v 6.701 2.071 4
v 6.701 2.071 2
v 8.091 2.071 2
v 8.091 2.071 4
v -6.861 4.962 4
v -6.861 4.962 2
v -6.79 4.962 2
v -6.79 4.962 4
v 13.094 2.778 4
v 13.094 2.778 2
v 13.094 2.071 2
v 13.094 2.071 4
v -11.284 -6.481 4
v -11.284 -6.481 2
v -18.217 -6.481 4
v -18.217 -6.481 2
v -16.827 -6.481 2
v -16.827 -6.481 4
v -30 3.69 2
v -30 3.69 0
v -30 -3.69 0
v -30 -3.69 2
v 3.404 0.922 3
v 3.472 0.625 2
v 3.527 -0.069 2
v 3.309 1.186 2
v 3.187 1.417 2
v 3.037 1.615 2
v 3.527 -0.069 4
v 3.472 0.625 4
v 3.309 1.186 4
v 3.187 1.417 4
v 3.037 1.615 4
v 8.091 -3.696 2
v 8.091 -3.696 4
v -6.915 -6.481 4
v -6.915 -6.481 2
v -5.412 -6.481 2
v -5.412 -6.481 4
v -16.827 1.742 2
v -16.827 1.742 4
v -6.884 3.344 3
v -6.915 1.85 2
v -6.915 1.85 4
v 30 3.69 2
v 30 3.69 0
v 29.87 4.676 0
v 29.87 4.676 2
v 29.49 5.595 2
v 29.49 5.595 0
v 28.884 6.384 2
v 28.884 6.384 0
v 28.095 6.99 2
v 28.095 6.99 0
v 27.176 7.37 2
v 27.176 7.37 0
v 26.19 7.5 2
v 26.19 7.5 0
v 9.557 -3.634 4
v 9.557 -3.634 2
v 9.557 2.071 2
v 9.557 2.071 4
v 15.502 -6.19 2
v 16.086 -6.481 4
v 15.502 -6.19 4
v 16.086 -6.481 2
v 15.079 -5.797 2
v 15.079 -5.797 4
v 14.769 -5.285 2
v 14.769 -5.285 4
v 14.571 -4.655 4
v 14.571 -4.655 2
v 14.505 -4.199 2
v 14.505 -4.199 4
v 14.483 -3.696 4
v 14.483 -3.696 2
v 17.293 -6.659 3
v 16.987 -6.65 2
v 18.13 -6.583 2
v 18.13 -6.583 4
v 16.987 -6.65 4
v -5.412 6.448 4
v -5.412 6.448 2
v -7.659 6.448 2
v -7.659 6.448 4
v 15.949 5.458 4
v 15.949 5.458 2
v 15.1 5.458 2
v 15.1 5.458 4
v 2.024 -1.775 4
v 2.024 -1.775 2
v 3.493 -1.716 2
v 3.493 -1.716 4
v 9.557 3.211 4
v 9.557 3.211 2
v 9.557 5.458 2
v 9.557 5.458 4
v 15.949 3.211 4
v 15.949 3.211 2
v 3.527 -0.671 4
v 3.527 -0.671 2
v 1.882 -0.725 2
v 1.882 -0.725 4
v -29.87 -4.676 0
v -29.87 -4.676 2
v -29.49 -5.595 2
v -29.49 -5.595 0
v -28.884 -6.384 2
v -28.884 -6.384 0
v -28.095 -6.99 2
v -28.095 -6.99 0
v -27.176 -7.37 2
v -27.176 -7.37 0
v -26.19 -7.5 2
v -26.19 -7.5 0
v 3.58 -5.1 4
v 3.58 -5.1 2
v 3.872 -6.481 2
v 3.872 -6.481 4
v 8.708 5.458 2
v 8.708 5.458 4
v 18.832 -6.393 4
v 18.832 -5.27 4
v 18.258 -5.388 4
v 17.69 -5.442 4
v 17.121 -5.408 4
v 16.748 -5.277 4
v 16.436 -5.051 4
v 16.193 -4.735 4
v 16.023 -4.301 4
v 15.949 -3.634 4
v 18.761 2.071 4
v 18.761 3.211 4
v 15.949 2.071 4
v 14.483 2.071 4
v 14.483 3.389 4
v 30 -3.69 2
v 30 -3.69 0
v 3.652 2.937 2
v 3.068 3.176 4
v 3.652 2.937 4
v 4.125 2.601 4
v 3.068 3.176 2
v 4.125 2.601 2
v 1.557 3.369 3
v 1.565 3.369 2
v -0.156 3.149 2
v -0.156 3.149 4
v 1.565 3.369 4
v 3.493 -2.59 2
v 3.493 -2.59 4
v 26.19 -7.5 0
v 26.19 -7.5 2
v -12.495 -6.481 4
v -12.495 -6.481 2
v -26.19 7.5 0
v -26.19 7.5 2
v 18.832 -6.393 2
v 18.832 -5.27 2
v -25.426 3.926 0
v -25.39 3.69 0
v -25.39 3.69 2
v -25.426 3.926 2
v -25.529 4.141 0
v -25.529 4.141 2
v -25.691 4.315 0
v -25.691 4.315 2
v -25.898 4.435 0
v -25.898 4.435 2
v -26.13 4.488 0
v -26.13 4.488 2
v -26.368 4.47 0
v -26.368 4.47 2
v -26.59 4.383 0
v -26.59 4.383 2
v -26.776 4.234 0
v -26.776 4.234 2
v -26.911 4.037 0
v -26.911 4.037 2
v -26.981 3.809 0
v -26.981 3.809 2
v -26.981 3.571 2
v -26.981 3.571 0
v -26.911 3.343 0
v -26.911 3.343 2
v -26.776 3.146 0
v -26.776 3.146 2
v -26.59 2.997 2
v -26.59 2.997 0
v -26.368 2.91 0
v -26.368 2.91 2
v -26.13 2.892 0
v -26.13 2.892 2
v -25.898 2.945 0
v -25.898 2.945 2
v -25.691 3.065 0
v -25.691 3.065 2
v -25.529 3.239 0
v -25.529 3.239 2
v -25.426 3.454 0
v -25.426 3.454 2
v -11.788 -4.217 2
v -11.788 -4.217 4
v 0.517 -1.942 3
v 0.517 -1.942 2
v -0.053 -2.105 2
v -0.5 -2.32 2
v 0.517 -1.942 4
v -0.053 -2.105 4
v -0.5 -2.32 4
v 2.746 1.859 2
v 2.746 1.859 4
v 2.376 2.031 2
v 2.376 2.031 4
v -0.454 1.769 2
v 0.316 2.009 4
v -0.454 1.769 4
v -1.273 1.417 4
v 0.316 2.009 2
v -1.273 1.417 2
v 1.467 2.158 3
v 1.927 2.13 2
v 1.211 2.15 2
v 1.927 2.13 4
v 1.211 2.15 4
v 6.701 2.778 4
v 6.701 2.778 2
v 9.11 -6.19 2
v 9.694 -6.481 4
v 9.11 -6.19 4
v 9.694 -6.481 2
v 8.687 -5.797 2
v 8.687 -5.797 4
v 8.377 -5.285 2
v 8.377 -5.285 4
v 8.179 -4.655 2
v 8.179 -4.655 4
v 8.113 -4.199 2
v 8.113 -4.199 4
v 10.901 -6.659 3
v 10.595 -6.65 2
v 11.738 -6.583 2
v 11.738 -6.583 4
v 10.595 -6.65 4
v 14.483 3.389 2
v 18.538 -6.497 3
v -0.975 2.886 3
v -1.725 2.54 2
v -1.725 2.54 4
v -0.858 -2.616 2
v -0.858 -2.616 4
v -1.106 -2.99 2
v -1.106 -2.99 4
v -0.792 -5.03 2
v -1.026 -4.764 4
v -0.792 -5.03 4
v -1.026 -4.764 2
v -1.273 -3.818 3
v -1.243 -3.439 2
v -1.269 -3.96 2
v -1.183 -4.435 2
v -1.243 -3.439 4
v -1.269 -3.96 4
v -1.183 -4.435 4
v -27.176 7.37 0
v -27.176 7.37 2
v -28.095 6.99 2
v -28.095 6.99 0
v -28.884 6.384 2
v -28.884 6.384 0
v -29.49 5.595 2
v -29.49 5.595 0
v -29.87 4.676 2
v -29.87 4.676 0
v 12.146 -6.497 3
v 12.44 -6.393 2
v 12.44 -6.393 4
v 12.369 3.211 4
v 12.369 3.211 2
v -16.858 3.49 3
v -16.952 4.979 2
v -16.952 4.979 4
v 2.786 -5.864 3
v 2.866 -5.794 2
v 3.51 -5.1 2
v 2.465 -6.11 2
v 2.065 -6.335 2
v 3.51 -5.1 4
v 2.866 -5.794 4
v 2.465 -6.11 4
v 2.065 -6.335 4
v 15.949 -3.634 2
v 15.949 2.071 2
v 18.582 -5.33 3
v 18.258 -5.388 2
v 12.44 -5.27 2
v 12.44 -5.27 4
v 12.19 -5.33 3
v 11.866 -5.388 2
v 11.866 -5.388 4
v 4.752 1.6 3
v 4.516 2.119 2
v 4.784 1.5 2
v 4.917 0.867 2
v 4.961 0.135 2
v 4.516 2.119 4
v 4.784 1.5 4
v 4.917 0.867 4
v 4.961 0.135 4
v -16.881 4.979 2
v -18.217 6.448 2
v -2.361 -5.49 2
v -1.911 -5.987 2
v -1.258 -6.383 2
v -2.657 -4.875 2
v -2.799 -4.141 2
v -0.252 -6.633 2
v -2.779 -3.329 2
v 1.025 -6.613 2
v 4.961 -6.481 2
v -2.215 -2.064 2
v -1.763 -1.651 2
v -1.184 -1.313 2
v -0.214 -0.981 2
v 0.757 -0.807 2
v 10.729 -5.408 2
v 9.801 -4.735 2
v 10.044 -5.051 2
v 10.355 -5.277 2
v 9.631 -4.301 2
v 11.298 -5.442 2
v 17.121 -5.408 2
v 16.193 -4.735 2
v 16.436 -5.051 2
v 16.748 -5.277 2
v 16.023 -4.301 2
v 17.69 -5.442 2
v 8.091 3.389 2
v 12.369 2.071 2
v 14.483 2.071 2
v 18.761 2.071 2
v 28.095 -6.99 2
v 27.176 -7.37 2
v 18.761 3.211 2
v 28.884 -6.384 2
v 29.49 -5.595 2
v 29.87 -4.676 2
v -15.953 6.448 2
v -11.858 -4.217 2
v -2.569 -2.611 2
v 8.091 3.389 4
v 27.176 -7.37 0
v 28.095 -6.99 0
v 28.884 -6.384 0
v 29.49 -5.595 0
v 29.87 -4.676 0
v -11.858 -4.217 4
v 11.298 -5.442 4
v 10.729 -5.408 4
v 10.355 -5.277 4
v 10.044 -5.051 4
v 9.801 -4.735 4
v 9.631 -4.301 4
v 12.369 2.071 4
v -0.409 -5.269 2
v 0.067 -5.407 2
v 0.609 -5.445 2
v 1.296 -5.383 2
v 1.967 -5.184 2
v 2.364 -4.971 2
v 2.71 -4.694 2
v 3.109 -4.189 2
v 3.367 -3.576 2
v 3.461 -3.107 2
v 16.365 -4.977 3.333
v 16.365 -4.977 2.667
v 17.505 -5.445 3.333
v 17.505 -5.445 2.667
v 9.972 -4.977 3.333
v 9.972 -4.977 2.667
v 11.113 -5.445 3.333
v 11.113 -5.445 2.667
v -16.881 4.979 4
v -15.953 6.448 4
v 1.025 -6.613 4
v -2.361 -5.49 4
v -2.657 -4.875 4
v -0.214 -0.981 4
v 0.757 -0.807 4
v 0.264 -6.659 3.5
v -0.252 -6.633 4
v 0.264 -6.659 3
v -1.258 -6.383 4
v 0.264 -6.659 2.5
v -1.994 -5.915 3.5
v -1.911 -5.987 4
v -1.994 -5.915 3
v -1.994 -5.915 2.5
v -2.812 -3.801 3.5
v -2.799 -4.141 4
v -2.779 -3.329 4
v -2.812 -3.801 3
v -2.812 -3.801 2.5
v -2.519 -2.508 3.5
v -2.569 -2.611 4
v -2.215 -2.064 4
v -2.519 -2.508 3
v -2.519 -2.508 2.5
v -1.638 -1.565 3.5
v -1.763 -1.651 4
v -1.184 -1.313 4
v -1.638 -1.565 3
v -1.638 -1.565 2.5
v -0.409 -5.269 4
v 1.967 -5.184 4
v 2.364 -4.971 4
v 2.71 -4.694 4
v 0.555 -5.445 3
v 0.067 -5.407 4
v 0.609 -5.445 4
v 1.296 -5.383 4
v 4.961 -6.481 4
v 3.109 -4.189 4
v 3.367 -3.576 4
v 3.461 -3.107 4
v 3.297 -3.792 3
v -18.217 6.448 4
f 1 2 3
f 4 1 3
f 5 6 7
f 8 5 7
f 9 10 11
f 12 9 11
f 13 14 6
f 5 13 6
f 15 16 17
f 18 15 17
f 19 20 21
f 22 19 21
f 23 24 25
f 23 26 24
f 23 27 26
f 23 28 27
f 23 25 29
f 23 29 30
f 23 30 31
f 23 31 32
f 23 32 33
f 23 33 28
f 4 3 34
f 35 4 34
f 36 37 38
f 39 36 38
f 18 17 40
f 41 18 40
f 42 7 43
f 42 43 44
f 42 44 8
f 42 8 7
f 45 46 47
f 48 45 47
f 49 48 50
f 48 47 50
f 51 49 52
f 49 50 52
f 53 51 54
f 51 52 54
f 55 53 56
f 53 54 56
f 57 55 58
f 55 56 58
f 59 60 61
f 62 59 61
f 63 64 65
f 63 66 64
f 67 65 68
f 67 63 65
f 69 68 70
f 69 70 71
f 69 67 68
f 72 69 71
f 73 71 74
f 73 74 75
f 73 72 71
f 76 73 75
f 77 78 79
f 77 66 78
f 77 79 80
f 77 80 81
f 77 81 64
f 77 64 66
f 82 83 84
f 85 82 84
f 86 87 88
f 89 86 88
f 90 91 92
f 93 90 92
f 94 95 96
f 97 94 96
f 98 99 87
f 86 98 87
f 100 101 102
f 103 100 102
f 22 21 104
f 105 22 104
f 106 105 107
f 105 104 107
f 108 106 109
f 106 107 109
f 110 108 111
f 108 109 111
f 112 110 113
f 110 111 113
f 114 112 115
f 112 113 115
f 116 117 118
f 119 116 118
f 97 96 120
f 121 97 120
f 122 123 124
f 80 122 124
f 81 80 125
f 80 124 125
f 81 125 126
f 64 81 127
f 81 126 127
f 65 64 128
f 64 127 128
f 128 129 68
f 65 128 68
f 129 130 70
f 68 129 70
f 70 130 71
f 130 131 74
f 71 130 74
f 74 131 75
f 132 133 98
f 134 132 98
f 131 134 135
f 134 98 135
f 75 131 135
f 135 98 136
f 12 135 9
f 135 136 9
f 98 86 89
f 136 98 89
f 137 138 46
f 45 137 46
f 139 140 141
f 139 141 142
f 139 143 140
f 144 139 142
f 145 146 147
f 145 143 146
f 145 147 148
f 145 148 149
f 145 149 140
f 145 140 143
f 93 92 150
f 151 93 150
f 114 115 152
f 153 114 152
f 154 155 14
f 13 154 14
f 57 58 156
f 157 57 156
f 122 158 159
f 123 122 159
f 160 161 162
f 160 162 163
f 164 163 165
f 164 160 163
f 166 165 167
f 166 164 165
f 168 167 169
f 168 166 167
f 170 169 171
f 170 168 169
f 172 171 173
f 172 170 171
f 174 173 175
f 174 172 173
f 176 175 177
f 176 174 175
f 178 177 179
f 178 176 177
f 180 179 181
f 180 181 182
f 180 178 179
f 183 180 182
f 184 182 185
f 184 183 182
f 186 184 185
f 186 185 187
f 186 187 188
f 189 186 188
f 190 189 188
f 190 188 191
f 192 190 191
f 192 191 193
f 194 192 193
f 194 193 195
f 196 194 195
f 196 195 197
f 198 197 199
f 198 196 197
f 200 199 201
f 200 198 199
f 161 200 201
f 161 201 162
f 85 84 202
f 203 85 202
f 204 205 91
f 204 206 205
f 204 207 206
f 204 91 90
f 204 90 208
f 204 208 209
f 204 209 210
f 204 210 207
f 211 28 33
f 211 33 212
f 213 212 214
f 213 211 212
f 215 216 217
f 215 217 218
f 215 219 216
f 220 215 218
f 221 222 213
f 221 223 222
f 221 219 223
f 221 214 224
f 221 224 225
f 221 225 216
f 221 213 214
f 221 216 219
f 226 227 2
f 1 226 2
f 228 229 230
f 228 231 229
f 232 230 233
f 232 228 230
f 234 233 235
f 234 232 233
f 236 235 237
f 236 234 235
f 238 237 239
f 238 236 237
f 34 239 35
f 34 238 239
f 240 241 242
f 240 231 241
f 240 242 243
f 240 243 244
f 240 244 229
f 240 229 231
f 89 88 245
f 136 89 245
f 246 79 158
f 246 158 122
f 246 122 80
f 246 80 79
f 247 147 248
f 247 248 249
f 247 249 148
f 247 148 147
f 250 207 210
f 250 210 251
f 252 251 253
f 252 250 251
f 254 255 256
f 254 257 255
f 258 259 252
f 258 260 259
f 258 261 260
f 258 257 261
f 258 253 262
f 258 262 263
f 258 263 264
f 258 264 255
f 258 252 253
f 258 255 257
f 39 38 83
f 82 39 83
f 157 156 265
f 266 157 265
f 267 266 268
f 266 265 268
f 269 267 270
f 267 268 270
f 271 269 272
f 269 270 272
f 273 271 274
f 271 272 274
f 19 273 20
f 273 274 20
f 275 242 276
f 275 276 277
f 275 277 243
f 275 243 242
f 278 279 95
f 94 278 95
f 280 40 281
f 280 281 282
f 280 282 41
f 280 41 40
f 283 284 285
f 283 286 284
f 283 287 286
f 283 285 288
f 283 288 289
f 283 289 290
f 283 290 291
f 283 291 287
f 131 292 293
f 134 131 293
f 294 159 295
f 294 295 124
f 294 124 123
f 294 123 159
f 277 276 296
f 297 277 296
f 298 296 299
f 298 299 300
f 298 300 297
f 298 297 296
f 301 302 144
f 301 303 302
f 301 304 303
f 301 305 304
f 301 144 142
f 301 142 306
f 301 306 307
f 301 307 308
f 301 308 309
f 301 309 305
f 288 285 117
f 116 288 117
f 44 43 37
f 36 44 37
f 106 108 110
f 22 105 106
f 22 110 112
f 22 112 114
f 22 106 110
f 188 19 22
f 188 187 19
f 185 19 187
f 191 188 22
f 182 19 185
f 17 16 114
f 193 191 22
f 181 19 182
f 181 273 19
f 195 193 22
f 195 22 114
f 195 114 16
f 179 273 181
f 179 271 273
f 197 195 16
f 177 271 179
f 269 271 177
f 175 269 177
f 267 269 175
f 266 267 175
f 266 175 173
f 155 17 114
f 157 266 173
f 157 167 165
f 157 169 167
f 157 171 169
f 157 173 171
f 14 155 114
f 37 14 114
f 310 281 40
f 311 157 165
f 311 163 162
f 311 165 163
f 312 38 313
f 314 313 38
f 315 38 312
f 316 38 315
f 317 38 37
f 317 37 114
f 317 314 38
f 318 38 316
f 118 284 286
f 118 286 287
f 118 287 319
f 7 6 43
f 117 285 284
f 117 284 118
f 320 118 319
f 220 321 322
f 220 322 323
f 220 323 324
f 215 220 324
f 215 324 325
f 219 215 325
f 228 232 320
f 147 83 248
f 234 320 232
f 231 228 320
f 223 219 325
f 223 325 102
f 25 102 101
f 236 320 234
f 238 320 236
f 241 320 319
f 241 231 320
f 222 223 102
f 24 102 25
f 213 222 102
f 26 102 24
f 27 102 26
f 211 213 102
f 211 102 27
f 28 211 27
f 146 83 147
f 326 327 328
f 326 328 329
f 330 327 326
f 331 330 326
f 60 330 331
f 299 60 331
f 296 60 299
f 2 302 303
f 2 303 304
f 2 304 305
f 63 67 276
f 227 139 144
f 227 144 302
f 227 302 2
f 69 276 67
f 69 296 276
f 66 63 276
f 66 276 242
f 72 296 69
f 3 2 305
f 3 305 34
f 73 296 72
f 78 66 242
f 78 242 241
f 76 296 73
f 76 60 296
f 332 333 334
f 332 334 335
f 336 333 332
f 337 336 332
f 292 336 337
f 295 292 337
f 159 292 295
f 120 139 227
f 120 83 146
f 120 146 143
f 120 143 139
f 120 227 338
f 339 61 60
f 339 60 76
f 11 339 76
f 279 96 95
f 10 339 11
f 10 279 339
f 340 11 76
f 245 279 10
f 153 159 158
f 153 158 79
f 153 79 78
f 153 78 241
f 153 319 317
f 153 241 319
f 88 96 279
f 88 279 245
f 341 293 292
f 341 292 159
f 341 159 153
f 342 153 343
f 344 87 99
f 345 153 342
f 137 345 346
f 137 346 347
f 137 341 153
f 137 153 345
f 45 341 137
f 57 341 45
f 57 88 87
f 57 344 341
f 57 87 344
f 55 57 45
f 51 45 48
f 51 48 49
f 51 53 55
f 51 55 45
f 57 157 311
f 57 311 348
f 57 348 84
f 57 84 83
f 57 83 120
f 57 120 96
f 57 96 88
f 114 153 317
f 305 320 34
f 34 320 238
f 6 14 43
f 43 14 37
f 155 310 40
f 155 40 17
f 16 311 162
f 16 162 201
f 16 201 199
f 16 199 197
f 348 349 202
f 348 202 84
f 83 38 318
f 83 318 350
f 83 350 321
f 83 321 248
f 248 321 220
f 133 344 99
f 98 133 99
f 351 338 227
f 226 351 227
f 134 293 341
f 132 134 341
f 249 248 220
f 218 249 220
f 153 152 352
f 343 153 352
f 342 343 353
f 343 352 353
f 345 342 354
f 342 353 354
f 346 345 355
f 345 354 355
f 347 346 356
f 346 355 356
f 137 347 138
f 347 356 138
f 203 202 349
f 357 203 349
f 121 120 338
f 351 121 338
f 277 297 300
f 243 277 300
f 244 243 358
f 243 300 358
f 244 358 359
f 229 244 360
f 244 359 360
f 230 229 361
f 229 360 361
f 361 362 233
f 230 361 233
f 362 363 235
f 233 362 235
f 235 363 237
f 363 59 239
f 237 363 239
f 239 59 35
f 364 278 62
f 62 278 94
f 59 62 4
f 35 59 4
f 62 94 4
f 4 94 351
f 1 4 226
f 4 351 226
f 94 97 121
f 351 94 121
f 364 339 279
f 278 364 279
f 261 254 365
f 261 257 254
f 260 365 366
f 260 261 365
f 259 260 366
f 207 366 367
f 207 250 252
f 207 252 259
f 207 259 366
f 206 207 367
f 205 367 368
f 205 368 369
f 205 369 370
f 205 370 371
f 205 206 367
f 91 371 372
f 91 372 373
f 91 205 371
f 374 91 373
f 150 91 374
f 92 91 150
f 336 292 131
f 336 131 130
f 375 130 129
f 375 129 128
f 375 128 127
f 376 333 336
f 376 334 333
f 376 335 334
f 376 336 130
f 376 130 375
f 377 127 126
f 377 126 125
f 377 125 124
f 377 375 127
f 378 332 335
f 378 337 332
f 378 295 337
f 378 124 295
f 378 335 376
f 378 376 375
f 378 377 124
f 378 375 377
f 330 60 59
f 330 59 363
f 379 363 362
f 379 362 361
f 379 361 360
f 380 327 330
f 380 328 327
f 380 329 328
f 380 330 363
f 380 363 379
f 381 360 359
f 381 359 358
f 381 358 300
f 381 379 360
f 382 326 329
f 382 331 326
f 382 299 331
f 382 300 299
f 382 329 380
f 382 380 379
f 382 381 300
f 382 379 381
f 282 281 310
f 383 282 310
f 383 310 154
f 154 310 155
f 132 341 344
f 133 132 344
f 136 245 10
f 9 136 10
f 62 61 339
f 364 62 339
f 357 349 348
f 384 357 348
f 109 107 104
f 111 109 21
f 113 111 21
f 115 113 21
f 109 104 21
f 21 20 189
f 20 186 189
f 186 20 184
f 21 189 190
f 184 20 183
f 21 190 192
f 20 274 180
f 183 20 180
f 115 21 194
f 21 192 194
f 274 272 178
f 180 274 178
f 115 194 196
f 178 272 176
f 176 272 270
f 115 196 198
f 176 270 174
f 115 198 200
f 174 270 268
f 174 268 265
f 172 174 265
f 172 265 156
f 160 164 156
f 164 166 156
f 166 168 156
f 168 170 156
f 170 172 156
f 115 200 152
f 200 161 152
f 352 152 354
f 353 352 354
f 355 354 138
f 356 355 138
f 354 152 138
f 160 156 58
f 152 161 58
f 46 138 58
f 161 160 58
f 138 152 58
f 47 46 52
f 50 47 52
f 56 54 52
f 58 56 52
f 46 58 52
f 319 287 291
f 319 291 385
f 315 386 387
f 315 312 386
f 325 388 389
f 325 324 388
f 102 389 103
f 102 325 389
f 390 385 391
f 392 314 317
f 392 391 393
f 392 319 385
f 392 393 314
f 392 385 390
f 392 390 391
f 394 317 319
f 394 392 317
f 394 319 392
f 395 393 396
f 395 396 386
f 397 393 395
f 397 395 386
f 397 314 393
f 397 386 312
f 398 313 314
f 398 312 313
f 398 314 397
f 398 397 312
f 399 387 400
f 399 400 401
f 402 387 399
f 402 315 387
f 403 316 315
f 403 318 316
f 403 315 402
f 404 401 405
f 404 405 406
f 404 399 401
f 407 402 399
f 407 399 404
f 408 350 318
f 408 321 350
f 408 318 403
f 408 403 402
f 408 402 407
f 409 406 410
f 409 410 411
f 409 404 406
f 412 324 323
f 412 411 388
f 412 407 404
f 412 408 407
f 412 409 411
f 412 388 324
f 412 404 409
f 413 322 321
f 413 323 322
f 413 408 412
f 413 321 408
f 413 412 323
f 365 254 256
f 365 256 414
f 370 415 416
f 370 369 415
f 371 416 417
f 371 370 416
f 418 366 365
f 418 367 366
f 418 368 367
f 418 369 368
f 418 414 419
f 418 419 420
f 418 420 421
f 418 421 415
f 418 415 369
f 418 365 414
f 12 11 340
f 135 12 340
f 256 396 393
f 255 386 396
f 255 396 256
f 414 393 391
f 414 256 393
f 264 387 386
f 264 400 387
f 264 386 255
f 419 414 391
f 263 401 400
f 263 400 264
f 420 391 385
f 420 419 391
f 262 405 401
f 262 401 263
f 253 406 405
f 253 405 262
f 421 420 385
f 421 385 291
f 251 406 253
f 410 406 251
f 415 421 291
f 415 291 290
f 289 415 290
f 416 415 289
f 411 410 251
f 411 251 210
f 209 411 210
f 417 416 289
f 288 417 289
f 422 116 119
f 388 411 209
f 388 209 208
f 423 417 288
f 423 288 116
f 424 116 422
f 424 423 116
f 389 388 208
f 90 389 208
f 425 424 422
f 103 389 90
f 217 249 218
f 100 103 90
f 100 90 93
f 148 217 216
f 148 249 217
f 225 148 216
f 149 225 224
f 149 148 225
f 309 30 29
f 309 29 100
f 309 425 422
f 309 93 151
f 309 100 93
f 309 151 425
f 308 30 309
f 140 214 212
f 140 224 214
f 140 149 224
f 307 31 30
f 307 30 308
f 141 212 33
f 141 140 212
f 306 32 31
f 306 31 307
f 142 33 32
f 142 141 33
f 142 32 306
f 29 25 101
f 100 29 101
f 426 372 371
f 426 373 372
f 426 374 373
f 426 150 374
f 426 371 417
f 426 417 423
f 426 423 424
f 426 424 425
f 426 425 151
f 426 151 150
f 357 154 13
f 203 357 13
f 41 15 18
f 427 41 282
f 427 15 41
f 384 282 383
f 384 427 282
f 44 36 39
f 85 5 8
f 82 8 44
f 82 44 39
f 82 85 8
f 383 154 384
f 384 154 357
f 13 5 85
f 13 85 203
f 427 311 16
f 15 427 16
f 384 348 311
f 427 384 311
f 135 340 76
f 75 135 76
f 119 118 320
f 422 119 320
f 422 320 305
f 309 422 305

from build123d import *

# Parameters (mm, degrees)
F0_R     = 0.8
F1_DEPTH = 2
F2_DEPTH = 4
F3_DEPTH = 4
F4_DEPTH = 2
F5_DEPTH = 4
F6_DEPTH = 2.5


with BuildPart() as f1:
    # F0 (on Top) → F1 (new body)
    with BuildSketch(Plane.XY):
        with BuildLine():
            ThreePointArc((30, 3.69), (28.8840768363, 6.3840768363), (26.19, 7.5))
            Line((26.19, 7.5), (-26.19, 7.5))
            ThreePointArc((-26.19, 7.5), (-28.8840768363, 6.3840768363), (-30, 3.69))
            Line((-30, 3.69), (-30, -3.69))
            ThreePointArc((-30, -3.69), (-28.8840768363, -6.3840768363), (-26.19, -7.5))
            Line((-26.19, -7.5), (26.19, -7.5))
            ThreePointArc((26.19, -7.5), (28.8840768363, -6.3840768363), (30, -3.69))
            Line((30, -3.69), (30, 3.69))
        make_face()
        with BuildLine():
            Line((-11.2838908856, -6.4806478423), (-12.4949831323, -6.4806478423))
            Line((-12.4949831323, -6.4806478423), (-16.8809480446, 4.9794540253))
            Line((-16.8809480446, 4.9794540253), (-16.9516894142, 4.9794540253))
            add(Edge.make_bspline(
                [(-16.9516894142, 4.9794540253), (-16.8271846037, 3.6183900751), (-16.8271846037, 1.7423289545)],
                knots=[0, 0, 0, 1, 1, 1], degree=2))
            Line((-16.8271846037, 1.7423289545), (-16.8271846037, -6.4806478423))
            Line((-16.8271846037, -6.4806478423), (-18.2165451018, -6.4806478423))
            Line((-18.2165451018, -6.4806478423), (-18.2165451018, 6.4480448572))
            Line((-18.2165451018, 6.4480448572), (-15.9528212761, 6.4480448572))
            Line((-15.9528212761, 6.4480448572), (-11.8583108063, -4.2169240166))
            Line((-11.8583108063, -4.2169240166), (-11.7875694368, -4.2169240166))
            Line((-11.7875694368, -4.2169240166), (-7.6591031097, 6.4480448572))
            Line((-7.6591031097, 6.4480448572), (-5.4123572127, 6.4480448572))
            Line((-5.4123572127, 6.4480448572), (-5.4123572127, -6.4806478423))
            Line((-5.4123572127, -6.4806478423), (-6.914903902, -6.4806478423))
            Line((-6.914903902, -6.4806478423), (-6.914903902, 1.8498558363))
            add(Edge.make_bspline(
                [(-6.914903902, 1.8498558363), (-6.914903902, 3.281661156), (-6.7903990916, 4.9624760966)],
                knots=[0, 0, 0, 1, 1, 1], degree=2))
            Line((-6.7903990916, 4.9624760966), (-6.8611404611, 4.9624760966))
            Line((-6.8611404611, 4.9624760966), (-11.2838908856, -6.4806478423))
        make_face(mode=Mode.SUBTRACT)
        with BuildLine():
            Line((4.9611572186, -6.4806478423), (3.8717401274, -6.4806478423))
            Line((3.8717401274, -6.4806478423), (3.5802856849, -5.0997763086))
            Line((3.5802856849, -5.0997763086), (3.5095443153, -5.0997763086))
            add(Edge.make_bspline(
                [(3.5095443153, -5.0997763086), (2.7851526911, -6.0109251485), (2.0650055491, -6.334920621)],
                knots=[0, 0, 0, 1, 1, 1], degree=2))
            add(Edge.make_bspline(
                [(2.0650055491, -6.334920621), (1.344858407, -6.6589160936), (0.2639302802, -6.6589160936)],
                knots=[0, 0, 0, 1, 1, 1], degree=2))
            add(Edge.make_bspline(
                [(0.2639302802, -6.6589160936), (-1.1763640039, -6.6589160936), (-1.9941342359, -5.9147168859)],
                knots=[0, 0, 0, 1, 1, 1], degree=2))
            add(Edge.make_bspline(
                [(-1.9941342359, -5.9147168859), (-2.8119044679, -5.1705176782), (-2.8119044679, -3.8009647636)],
                knots=[0, 0, 0, 1, 1, 1], degree=2))
            add(Edge.make_bspline(
                [(-2.8119044679, -3.8009647636), (-2.8119044679, -0.8666127546), (1.8824928156, -0.7251300155)],
                knots=[0, 0, 0, 1, 1, 1], degree=2))
            Line((1.8824928156, -0.7251300155), (3.526522244, -0.6713665746))
            Line((3.526522244, -0.6713665746), (3.526522244, -0.068650106))
            add(Edge.make_bspline(
                [(3.526522244, -0.068650106), (3.526522244, 1.0717007712), (3.0369919667, 1.6149944893)],
                knots=[0, 0, 0, 1, 1, 1], degree=2))
            add(Edge.make_bspline(
                [(3.0369919667, 1.6149944893), (2.5474616894, 2.1582882075), (1.4665335626, 2.1582882075)],
                knots=[0, 0, 0, 1, 1, 1], degree=2))
            add(Edge.make_bspline(
                [(1.4665335626, 2.1582882075), (0.2554413159, 2.1582882075), (-1.2725722664, 1.4169186546)],
                knots=[0, 0, 0, 1, 1, 1], degree=2))
            Line((-1.2725722664, 1.4169186546), (-1.7253170316, 2.5402916031))
            add(Edge.make_bspline(
                [(-1.7253170316, 2.5402916031), (-1.0094143717, 2.9279543082), (-0.1562734549, 3.1486673813)],
                knots=[0, 0, 0, 1, 1, 1], degree=2))
            add(Edge.make_bspline(
                [(-0.1562734549, 3.1486673813), (0.6968674619, 3.3693804543), (1.5570825157, 3.3693804543)],
                knots=[0, 0, 0, 1, 1, 1], degree=2))
            add(Edge.make_bspline(
                [(1.5570825157, 3.3693804543), (3.2888312423, 3.3693804543), (4.1249942304, 2.6011291809)],
                knots=[0, 0, 0, 1, 1, 1], degree=2))
            add(Edge.make_bspline(
                [(4.1249942304, 2.6011291809), (4.9611572186, 1.8328779076), (4.9611572186, 0.1350850383)],
                knots=[0, 0, 0, 1, 1, 1], degree=2))
            Line((4.9611572186, 0.1350850383), (4.9611572186, -6.4806478423))
        make_face(mode=Mode.SUBTRACT)
        with BuildLine():
            add(Edge.make_bspline(
                [(9.9724758377, -4.9766863256), (10.3884350907, -5.444994192), (11.1128267149, -5.444994192)],
                knots=[0, 0, 0, 1, 1, 1], degree=2))
            add(Edge.make_bspline(
                [(11.1128267149, -5.444994192), (11.5033190748, -5.444994192), (11.8655148869, -5.3884010964)],
                knots=[0, 0, 0, 1, 1, 1], degree=2))
            add(Edge.make_bspline(
                [(11.8655148869, -5.3884010964), (12.227710699, -5.3318080007), (12.4399348077, -5.2695555955)],
                knots=[0, 0, 0, 1, 1, 1], degree=2))
            Line((12.4399348077, -5.2695555955), (12.4399348077, -6.392928544))
            add(Edge.make_bspline(
                [(12.4399348077, -6.392928544), (12.202243806, -6.5061147353), (11.7381804217, -6.5825154144)],
                knots=[0, 0, 0, 1, 1, 1], degree=2))
            add(Edge.make_bspline(
                [(11.7381804217, -6.5825154144), (11.2741170375, -6.6589160936), (10.9006026062, -6.6589160936)],
                knots=[0, 0, 0, 1, 1, 1], degree=2))
            add(Edge.make_bspline(
                [(10.9006026062, -6.6589160936), (8.0907554076, -6.6589160936), (8.0907554076, -3.6962675367)],
                knots=[0, 0, 0, 1, 1, 1], degree=2))
            Line((8.0907554076, -3.6962675367), (8.0907554076, 2.0705689093))
            Line((8.0907554076, 2.0705689093), (6.7013949096, 2.0705689093))
            Line((6.7013949096, 2.0705689093), (6.7013949096, 2.7779826048))
            Line((6.7013949096, 2.7779826048), (8.0907554076, 3.3891880377))
            Line((8.0907554076, 3.3891880377), (8.7076201501, 5.4576656835))
            Line((8.7076201501, 5.4576656835), (9.5565165847, 5.4576656835))
            Line((9.5565165847, 5.4576656835), (9.5565165847, 3.2109197865))
            Line((9.5565165847, 3.2109197865), (12.3691934381, 3.2109197865))
            Line((12.3691934381, 3.2109197865), (12.3691934381, 2.0705689093))
            Line((12.3691934381, 2.0705689093), (9.5565165847, 2.0705689093))
            Line((9.5565165847, 2.0705689093), (9.5565165847, -3.6340151315))
            add(Edge.make_bspline(
                [(9.5565165847, -3.6340151315), (9.5565165847, -4.5083784592), (9.9724758377, -4.9766863256)],
                knots=[0, 0, 0, 1, 1, 1], degree=2))
        make_face(mode=Mode.SUBTRACT)
        with BuildLine():
            add(Edge.make_bspline(
                [(16.3646659905, -4.9766863256), (16.7806252435, -5.444994192), (17.5050168677, -5.444994192)],
                knots=[0, 0, 0, 1, 1, 1], degree=2))
            add(Edge.make_bspline(
                [(17.5050168677, -5.444994192), (17.8955092276, -5.444994192), (18.2577050397, -5.3884010964)],
                knots=[0, 0, 0, 1, 1, 1], degree=2))
            add(Edge.make_bspline(
                [(18.2577050397, -5.3884010964), (18.6199008518, -5.3318080007), (18.8321249605, -5.2695555955)],
                knots=[0, 0, 0, 1, 1, 1], degree=2))
            Line((18.8321249605, -5.2695555955), (18.8321249605, -6.392928544))
            add(Edge.make_bspline(
                [(18.8321249605, -6.392928544), (18.5944339588, -6.5061147353), (18.1303705745, -6.5825154144)],
                knots=[0, 0, 0, 1, 1, 1], degree=2))
            add(Edge.make_bspline(
                [(18.1303705745, -6.5825154144), (17.6663071903, -6.6589160936), (17.292792759, -6.6589160936)],
                knots=[0, 0, 0, 1, 1, 1], degree=2))
            add(Edge.make_bspline(
                [(17.292792759, -6.6589160936), (14.4829455604, -6.6589160936), (14.4829455604, -3.6962675367)],
                knots=[0, 0, 0, 1, 1, 1], degree=2))
            Line((14.4829455604, -3.6962675367), (14.4829455604, 2.0705689093))
            Line((14.4829455604, 2.0705689093), (13.0935850624, 2.0705689093))
            Line((13.0935850624, 2.0705689093), (13.0935850624, 2.7779826048))
            Line((13.0935850624, 2.7779826048), (14.4829455604, 3.3891880377))
            Line((14.4829455604, 3.3891880377), (15.0998103029, 5.4576656835))
            Line((15.0998103029, 5.4576656835), (15.9487067375, 5.4576656835))
            Line((15.9487067375, 5.4576656835), (15.9487067375, 3.2109197865))
            Line((15.9487067375, 3.2109197865), (18.7613835909, 3.2109197865))
            Line((18.7613835909, 3.2109197865), (18.7613835909, 2.0705689093))
            Line((18.7613835909, 2.0705689093), (15.9487067375, 2.0705689093))
            Line((15.9487067375, 2.0705689093), (15.9487067375, -3.6340151315))
            add(Edge.make_bspline(
                [(15.9487067375, -3.6340151315), (15.9487067375, -4.5083784592), (16.3646659905, -4.9766863256)],
                knots=[0, 0, 0, 1, 1, 1], degree=2))
        make_face(mode=Mode.SUBTRACT)
        with Locations((-26.19, 3.69)):
            Circle(F0_R, mode=Mode.SUBTRACT)
    extrude(amount=F1_DEPTH)

    # F0 (on Top) → F2 (join)
    with BuildSketch(Plane.XY):
        with BuildLine():
            Line((3.5802856849, -5.0997763086), (3.8717401274, -6.4806478423))
            Line((3.8717401274, -6.4806478423), (4.9611572186, -6.4806478423))
            Line((4.9611572186, -6.4806478423), (4.9611572186, 0.1350850383))
            add(Edge.make_bspline(
                [(4.1249942304, 2.6011291809), (4.9611572186, 1.8328779076), (4.9611572186, 0.1350850383)],
                knots=[0, 0, 0, 1, 1, 1], degree=2))
            add(Edge.make_bspline(
                [(1.5570825157, 3.3693804543), (3.2888312423, 3.3693804543), (4.1249942304, 2.6011291809)],
                knots=[0, 0, 0, 1, 1, 1], degree=2))
            add(Edge.make_bspline(
                [(-0.1562734549, 3.1486673813), (0.6968674619, 3.3693804543), (1.5570825157, 3.3693804543)],
                knots=[0, 0, 0, 1, 1, 1], degree=2))
            add(Edge.make_bspline(
                [(-1.7253170316, 2.5402916031), (-1.0094143717, 2.9279543082), (-0.1562734549, 3.1486673813)],
                knots=[0, 0, 0, 1, 1, 1], degree=2))
            Line((-1.7253170316, 2.5402916031), (-1.2725722664, 1.4169186546))
            add(Edge.make_bspline(
                [(1.4665335626, 2.1582882075), (0.2554413159, 2.1582882075), (-1.2725722664, 1.4169186546)],
                knots=[0, 0, 0, 1, 1, 1], degree=2))
            add(Edge.make_bspline(
                [(3.0369919667, 1.6149944893), (2.5474616894, 2.1582882075), (1.4665335626, 2.1582882075)],
                knots=[0, 0, 0, 1, 1, 1], degree=2))
            add(Edge.make_bspline(
                [(3.526522244, -0.068650106), (3.526522244, 1.0717007712), (3.0369919667, 1.6149944893)],
                knots=[0, 0, 0, 1, 1, 1], degree=2))
            Line((3.526522244, -0.068650106), (3.526522244, -0.6713665746))
            Line((3.526522244, -0.6713665746), (1.8824928156, -0.7251300155))
            add(Edge.make_bspline(
                [(-2.8119044679, -3.8009647636), (-2.8119044679, -0.8666127546), (1.8824928156, -0.7251300155)],
                knots=[0, 0, 0, 1, 1, 1], degree=2))
            add(Edge.make_bspline(
                [(-1.9941342359, -5.9147168859), (-2.8119044679, -5.1705176782), (-2.8119044679, -3.8009647636)],
                knots=[0, 0, 0, 1, 1, 1], degree=2))
            add(Edge.make_bspline(
                [(0.2639302802, -6.6589160936), (-1.1763640039, -6.6589160936), (-1.9941342359, -5.9147168859)],
                knots=[0, 0, 0, 1, 1, 1], degree=2))
            add(Edge.make_bspline(
                [(2.0650055491, -6.334920621), (1.344858407, -6.6589160936), (0.2639302802, -6.6589160936)],
                knots=[0, 0, 0, 1, 1, 1], degree=2))
            add(Edge.make_bspline(
                [(3.5095443153, -5.0997763086), (2.7851526911, -6.0109251485), (2.0650055491, -6.334920621)],
                knots=[0, 0, 0, 1, 1, 1], degree=2))
            Line((3.5095443153, -5.0997763086), (3.5802856849, -5.0997763086))
        make_face()
        with BuildLine():
            add(Edge.make_bspline(
                [(0.5553847228, -5.444994192), (1.9277672921, -5.444994192), (2.7101668394, -4.6937208474)],
                knots=[0, 0, 0, 1, 1, 1], degree=2))
            add(Edge.make_bspline(
                [(-0.7915309535, -5.0304497665), (-0.3104896405, -5.444994192), (0.5553847228, -5.444994192)],
                knots=[0, 0, 0, 1, 1, 1], degree=2))
            add(Edge.make_bspline(
                [(-1.2725722664, -3.8179426923), (-1.2725722664, -4.6159053409), (-0.7915309535, -5.0304497665)],
                knots=[0, 0, 0, 1, 1, 1], degree=2))
            add(Edge.make_bspline(
                [(-0.5000765109, -2.3196404852), (-1.2725722664, -2.8020966255), (-1.2725722664, -3.8179426923)],
                knots=[0, 0, 0, 1, 1, 1], degree=2))
            add(Edge.make_bspline(
                [(2.0239755547, -1.7749319396), (0.2724192446, -1.8371843448), (-0.5000765109, -2.3196404852)],
                knots=[0, 0, 0, 1, 1, 1], degree=2))
            Line((2.0239755547, -1.7749319396), (3.4925663866, -1.7155091892))
            Line((3.4925663866, -1.7155091892), (3.4925663866, -2.5898725169))
            add(Edge.make_bspline(
                [(2.7101668394, -4.6937208474), (3.4925663866, -3.9424475027), (3.4925663866, -2.5898725169)],
                knots=[0, 0, 0, 1, 1, 1], degree=2))
        make_face(mode=Mode.SUBTRACT)
    extrude(amount=F2_DEPTH)

    # F0 (on Top) → F3 (join)
    with BuildSketch(Plane.XY):
        with BuildLine():
            Line((-16.8809480446, 4.9794540253), (-12.4949831323, -6.4806478423))
            Line((-12.4949831323, -6.4806478423), (-11.2838908856, -6.4806478423))
            Line((-11.2838908856, -6.4806478423), (-6.8611404611, 4.9624760966))
            Line((-6.8611404611, 4.9624760966), (-6.7903990916, 4.9624760966))
            add(Edge.make_bspline(
                [(-6.914903902, 1.8498558363), (-6.914903902, 3.281661156), (-6.7903990916, 4.9624760966)],
                knots=[0, 0, 0, 1, 1, 1], degree=2))
            Line((-6.914903902, 1.8498558363), (-6.914903902, -6.4806478423))
            Line((-6.914903902, -6.4806478423), (-5.4123572127, -6.4806478423))
            Line((-5.4123572127, -6.4806478423), (-5.4123572127, 6.4480448572))
            Line((-5.4123572127, 6.4480448572), (-7.6591031097, 6.4480448572))
            Line((-7.6591031097, 6.4480448572), (-11.7875694368, -4.2169240166))
            Line((-11.7875694368, -4.2169240166), (-11.8583108063, -4.2169240166))
            Line((-11.8583108063, -4.2169240166), (-15.9528212761, 6.4480448572))
            Line((-15.9528212761, 6.4480448572), (-18.2165451018, 6.4480448572))
            Line((-18.2165451018, 6.4480448572), (-18.2165451018, -6.4806478423))
            Line((-18.2165451018, -6.4806478423), (-16.8271846037, -6.4806478423))
            Line((-16.8271846037, -6.4806478423), (-16.8271846037, 1.7423289545))
            add(Edge.make_bspline(
                [(-16.9516894142, 4.9794540253), (-16.8271846037, 3.6183900751), (-16.8271846037, 1.7423289545)],
                knots=[0, 0, 0, 1, 1, 1], degree=2))
            Line((-16.9516894142, 4.9794540253), (-16.8809480446, 4.9794540253))
        make_face()
    extrude(amount=F3_DEPTH)

    # F0 (on Top) → F4 (join)
    with BuildSketch(Plane.XY):
        with BuildLine():
            add(Edge.make_bspline(
                [(-0.7915309535, -5.0304497665), (-0.3104896405, -5.444994192), (0.5553847228, -5.444994192)],
                knots=[0, 0, 0, 1, 1, 1], degree=2))
            add(Edge.make_bspline(
                [(0.5553847228, -5.444994192), (1.9277672921, -5.444994192), (2.7101668394, -4.6937208474)],
                knots=[0, 0, 0, 1, 1, 1], degree=2))
            add(Edge.make_bspline(
                [(2.7101668394, -4.6937208474), (3.4925663866, -3.9424475027), (3.4925663866, -2.5898725169)],
                knots=[0, 0, 0, 1, 1, 1], degree=2))
            Line((3.4925663866, -2.5898725169), (3.4925663866, -1.7155091892))
            Line((3.4925663866, -1.7155091892), (2.0239755547, -1.7749319396))
            add(Edge.make_bspline(
                [(2.0239755547, -1.7749319396), (0.2724192446, -1.8371843448), (-0.5000765109, -2.3196404852)],
                knots=[0, 0, 0, 1, 1, 1], degree=2))
            add(Edge.make_bspline(
                [(-0.5000765109, -2.3196404852), (-1.2725722664, -2.8020966255), (-1.2725722664, -3.8179426923)],
                knots=[0, 0, 0, 1, 1, 1], degree=2))
            add(Edge.make_bspline(
                [(-1.2725722664, -3.8179426923), (-1.2725722664, -4.6159053409), (-0.7915309535, -5.0304497665)],
                knots=[0, 0, 0, 1, 1, 1], degree=2))
        make_face()
    extrude(amount=F4_DEPTH)

    # F0 (on Top) → F5 (join)
    with BuildSketch(Plane.XY):
        with BuildLine():
            add(Edge.make_bspline(
                [(11.1128267149, -5.444994192), (11.5033190748, -5.444994192), (11.8655148869, -5.3884010964)],
                knots=[0, 0, 0, 1, 1, 1], degree=2))
            add(Edge.make_bspline(
                [(9.9724758377, -4.9766863256), (10.3884350907, -5.444994192), (11.1128267149, -5.444994192)],
                knots=[0, 0, 0, 1, 1, 1], degree=2))
            add(Edge.make_bspline(
                [(9.5565165847, -3.6340151315), (9.5565165847, -4.5083784592), (9.9724758377, -4.9766863256)],
                knots=[0, 0, 0, 1, 1, 1], degree=2))
            Line((9.5565165847, -3.6340151315), (9.5565165847, 2.0705689093))
            Line((9.5565165847, 2.0705689093), (12.3691934381, 2.0705689093))
            Line((12.3691934381, 2.0705689093), (12.3691934381, 3.2109197865))
            Line((12.3691934381, 3.2109197865), (9.5565165847, 3.2109197865))
            Line((9.5565165847, 3.2109197865), (9.5565165847, 5.4576656835))
            Line((9.5565165847, 5.4576656835), (8.7076201501, 5.4576656835))
            Line((8.7076201501, 5.4576656835), (8.0907554076, 3.3891880377))
            Line((8.0907554076, 3.3891880377), (6.7013949096, 2.7779826048))
            Line((6.7013949096, 2.7779826048), (6.7013949096, 2.0705689093))
            Line((6.7013949096, 2.0705689093), (8.0907554076, 2.0705689093))
            Line((8.0907554076, 2.0705689093), (8.0907554076, -3.6962675367))
            add(Edge.make_bspline(
                [(10.9006026062, -6.6589160936), (8.0907554076, -6.6589160936), (8.0907554076, -3.6962675367)],
                knots=[0, 0, 0, 1, 1, 1], degree=2))
            add(Edge.make_bspline(
                [(11.7381804217, -6.5825154144), (11.2741170375, -6.6589160936), (10.9006026062, -6.6589160936)],
                knots=[0, 0, 0, 1, 1, 1], degree=2))
            add(Edge.make_bspline(
                [(12.4399348077, -6.392928544), (12.202243806, -6.5061147353), (11.7381804217, -6.5825154144)],
                knots=[0, 0, 0, 1, 1, 1], degree=2))
            Line((12.4399348077, -6.392928544), (12.4399348077, -5.2695555955))
            add(Edge.make_bspline(
                [(11.8655148869, -5.3884010964), (12.227710699, -5.3318080007), (12.4399348077, -5.2695555955)],
                knots=[0, 0, 0, 1, 1, 1], degree=2))
        make_face()
        with BuildLine():
            add(Edge.make_bspline(
                [(17.5050168677, -5.444994192), (17.8955092276, -5.444994192), (18.2577050397, -5.3884010964)],
                knots=[0, 0, 0, 1, 1, 1], degree=2))
            add(Edge.make_bspline(
                [(16.3646659905, -4.9766863256), (16.7806252435, -5.444994192), (17.5050168677, -5.444994192)],
                knots=[0, 0, 0, 1, 1, 1], degree=2))
            add(Edge.make_bspline(
                [(15.9487067375, -3.6340151315), (15.9487067375, -4.5083784592), (16.3646659905, -4.9766863256)],
                knots=[0, 0, 0, 1, 1, 1], degree=2))
            Line((15.9487067375, -3.6340151315), (15.9487067375, 2.0705689093))
            Line((15.9487067375, 2.0705689093), (18.7613835909, 2.0705689093))
            Line((18.7613835909, 2.0705689093), (18.7613835909, 3.2109197865))
            Line((18.7613835909, 3.2109197865), (15.9487067375, 3.2109197865))
            Line((15.9487067375, 3.2109197865), (15.9487067375, 5.4576656835))
            Line((15.9487067375, 5.4576656835), (15.0998103029, 5.4576656835))
            Line((15.0998103029, 5.4576656835), (14.4829455604, 3.3891880377))
            Line((14.4829455604, 3.3891880377), (13.0935850624, 2.7779826048))
            Line((13.0935850624, 2.7779826048), (13.0935850624, 2.0705689093))
            Line((13.0935850624, 2.0705689093), (14.4829455604, 2.0705689093))
            Line((14.4829455604, 2.0705689093), (14.4829455604, -3.6962675367))
            add(Edge.make_bspline(
                [(17.292792759, -6.6589160936), (14.4829455604, -6.6589160936), (14.4829455604, -3.6962675367)],
                knots=[0, 0, 0, 1, 1, 1], degree=2))
            add(Edge.make_bspline(
                [(18.1303705745, -6.5825154144), (17.6663071903, -6.6589160936), (17.292792759, -6.6589160936)],
                knots=[0, 0, 0, 1, 1, 1], degree=2))
            add(Edge.make_bspline(
                [(18.8321249605, -6.392928544), (18.5944339588, -6.5061147353), (18.1303705745, -6.5825154144)],
                knots=[0, 0, 0, 1, 1, 1], degree=2))
            Line((18.8321249605, -6.392928544), (18.8321249605, -5.2695555955))
            add(Edge.make_bspline(
                [(18.2577050397, -5.3884010964), (18.6199008518, -5.3318080007), (18.8321249605, -5.2695555955)],
                knots=[0, 0, 0, 1, 1, 1], degree=2))
        make_face()
    extrude(amount=F5_DEPTH)

    # F6 (add): a face of the model
    f6_faces = [f1.faces().sort_by_distance(p)[0] for p in [
        (-14.5180251043, -0.6855579578, 4),
    ]]
    extrude(f6_faces, amount=-F6_DEPTH)


solid = f1.part
